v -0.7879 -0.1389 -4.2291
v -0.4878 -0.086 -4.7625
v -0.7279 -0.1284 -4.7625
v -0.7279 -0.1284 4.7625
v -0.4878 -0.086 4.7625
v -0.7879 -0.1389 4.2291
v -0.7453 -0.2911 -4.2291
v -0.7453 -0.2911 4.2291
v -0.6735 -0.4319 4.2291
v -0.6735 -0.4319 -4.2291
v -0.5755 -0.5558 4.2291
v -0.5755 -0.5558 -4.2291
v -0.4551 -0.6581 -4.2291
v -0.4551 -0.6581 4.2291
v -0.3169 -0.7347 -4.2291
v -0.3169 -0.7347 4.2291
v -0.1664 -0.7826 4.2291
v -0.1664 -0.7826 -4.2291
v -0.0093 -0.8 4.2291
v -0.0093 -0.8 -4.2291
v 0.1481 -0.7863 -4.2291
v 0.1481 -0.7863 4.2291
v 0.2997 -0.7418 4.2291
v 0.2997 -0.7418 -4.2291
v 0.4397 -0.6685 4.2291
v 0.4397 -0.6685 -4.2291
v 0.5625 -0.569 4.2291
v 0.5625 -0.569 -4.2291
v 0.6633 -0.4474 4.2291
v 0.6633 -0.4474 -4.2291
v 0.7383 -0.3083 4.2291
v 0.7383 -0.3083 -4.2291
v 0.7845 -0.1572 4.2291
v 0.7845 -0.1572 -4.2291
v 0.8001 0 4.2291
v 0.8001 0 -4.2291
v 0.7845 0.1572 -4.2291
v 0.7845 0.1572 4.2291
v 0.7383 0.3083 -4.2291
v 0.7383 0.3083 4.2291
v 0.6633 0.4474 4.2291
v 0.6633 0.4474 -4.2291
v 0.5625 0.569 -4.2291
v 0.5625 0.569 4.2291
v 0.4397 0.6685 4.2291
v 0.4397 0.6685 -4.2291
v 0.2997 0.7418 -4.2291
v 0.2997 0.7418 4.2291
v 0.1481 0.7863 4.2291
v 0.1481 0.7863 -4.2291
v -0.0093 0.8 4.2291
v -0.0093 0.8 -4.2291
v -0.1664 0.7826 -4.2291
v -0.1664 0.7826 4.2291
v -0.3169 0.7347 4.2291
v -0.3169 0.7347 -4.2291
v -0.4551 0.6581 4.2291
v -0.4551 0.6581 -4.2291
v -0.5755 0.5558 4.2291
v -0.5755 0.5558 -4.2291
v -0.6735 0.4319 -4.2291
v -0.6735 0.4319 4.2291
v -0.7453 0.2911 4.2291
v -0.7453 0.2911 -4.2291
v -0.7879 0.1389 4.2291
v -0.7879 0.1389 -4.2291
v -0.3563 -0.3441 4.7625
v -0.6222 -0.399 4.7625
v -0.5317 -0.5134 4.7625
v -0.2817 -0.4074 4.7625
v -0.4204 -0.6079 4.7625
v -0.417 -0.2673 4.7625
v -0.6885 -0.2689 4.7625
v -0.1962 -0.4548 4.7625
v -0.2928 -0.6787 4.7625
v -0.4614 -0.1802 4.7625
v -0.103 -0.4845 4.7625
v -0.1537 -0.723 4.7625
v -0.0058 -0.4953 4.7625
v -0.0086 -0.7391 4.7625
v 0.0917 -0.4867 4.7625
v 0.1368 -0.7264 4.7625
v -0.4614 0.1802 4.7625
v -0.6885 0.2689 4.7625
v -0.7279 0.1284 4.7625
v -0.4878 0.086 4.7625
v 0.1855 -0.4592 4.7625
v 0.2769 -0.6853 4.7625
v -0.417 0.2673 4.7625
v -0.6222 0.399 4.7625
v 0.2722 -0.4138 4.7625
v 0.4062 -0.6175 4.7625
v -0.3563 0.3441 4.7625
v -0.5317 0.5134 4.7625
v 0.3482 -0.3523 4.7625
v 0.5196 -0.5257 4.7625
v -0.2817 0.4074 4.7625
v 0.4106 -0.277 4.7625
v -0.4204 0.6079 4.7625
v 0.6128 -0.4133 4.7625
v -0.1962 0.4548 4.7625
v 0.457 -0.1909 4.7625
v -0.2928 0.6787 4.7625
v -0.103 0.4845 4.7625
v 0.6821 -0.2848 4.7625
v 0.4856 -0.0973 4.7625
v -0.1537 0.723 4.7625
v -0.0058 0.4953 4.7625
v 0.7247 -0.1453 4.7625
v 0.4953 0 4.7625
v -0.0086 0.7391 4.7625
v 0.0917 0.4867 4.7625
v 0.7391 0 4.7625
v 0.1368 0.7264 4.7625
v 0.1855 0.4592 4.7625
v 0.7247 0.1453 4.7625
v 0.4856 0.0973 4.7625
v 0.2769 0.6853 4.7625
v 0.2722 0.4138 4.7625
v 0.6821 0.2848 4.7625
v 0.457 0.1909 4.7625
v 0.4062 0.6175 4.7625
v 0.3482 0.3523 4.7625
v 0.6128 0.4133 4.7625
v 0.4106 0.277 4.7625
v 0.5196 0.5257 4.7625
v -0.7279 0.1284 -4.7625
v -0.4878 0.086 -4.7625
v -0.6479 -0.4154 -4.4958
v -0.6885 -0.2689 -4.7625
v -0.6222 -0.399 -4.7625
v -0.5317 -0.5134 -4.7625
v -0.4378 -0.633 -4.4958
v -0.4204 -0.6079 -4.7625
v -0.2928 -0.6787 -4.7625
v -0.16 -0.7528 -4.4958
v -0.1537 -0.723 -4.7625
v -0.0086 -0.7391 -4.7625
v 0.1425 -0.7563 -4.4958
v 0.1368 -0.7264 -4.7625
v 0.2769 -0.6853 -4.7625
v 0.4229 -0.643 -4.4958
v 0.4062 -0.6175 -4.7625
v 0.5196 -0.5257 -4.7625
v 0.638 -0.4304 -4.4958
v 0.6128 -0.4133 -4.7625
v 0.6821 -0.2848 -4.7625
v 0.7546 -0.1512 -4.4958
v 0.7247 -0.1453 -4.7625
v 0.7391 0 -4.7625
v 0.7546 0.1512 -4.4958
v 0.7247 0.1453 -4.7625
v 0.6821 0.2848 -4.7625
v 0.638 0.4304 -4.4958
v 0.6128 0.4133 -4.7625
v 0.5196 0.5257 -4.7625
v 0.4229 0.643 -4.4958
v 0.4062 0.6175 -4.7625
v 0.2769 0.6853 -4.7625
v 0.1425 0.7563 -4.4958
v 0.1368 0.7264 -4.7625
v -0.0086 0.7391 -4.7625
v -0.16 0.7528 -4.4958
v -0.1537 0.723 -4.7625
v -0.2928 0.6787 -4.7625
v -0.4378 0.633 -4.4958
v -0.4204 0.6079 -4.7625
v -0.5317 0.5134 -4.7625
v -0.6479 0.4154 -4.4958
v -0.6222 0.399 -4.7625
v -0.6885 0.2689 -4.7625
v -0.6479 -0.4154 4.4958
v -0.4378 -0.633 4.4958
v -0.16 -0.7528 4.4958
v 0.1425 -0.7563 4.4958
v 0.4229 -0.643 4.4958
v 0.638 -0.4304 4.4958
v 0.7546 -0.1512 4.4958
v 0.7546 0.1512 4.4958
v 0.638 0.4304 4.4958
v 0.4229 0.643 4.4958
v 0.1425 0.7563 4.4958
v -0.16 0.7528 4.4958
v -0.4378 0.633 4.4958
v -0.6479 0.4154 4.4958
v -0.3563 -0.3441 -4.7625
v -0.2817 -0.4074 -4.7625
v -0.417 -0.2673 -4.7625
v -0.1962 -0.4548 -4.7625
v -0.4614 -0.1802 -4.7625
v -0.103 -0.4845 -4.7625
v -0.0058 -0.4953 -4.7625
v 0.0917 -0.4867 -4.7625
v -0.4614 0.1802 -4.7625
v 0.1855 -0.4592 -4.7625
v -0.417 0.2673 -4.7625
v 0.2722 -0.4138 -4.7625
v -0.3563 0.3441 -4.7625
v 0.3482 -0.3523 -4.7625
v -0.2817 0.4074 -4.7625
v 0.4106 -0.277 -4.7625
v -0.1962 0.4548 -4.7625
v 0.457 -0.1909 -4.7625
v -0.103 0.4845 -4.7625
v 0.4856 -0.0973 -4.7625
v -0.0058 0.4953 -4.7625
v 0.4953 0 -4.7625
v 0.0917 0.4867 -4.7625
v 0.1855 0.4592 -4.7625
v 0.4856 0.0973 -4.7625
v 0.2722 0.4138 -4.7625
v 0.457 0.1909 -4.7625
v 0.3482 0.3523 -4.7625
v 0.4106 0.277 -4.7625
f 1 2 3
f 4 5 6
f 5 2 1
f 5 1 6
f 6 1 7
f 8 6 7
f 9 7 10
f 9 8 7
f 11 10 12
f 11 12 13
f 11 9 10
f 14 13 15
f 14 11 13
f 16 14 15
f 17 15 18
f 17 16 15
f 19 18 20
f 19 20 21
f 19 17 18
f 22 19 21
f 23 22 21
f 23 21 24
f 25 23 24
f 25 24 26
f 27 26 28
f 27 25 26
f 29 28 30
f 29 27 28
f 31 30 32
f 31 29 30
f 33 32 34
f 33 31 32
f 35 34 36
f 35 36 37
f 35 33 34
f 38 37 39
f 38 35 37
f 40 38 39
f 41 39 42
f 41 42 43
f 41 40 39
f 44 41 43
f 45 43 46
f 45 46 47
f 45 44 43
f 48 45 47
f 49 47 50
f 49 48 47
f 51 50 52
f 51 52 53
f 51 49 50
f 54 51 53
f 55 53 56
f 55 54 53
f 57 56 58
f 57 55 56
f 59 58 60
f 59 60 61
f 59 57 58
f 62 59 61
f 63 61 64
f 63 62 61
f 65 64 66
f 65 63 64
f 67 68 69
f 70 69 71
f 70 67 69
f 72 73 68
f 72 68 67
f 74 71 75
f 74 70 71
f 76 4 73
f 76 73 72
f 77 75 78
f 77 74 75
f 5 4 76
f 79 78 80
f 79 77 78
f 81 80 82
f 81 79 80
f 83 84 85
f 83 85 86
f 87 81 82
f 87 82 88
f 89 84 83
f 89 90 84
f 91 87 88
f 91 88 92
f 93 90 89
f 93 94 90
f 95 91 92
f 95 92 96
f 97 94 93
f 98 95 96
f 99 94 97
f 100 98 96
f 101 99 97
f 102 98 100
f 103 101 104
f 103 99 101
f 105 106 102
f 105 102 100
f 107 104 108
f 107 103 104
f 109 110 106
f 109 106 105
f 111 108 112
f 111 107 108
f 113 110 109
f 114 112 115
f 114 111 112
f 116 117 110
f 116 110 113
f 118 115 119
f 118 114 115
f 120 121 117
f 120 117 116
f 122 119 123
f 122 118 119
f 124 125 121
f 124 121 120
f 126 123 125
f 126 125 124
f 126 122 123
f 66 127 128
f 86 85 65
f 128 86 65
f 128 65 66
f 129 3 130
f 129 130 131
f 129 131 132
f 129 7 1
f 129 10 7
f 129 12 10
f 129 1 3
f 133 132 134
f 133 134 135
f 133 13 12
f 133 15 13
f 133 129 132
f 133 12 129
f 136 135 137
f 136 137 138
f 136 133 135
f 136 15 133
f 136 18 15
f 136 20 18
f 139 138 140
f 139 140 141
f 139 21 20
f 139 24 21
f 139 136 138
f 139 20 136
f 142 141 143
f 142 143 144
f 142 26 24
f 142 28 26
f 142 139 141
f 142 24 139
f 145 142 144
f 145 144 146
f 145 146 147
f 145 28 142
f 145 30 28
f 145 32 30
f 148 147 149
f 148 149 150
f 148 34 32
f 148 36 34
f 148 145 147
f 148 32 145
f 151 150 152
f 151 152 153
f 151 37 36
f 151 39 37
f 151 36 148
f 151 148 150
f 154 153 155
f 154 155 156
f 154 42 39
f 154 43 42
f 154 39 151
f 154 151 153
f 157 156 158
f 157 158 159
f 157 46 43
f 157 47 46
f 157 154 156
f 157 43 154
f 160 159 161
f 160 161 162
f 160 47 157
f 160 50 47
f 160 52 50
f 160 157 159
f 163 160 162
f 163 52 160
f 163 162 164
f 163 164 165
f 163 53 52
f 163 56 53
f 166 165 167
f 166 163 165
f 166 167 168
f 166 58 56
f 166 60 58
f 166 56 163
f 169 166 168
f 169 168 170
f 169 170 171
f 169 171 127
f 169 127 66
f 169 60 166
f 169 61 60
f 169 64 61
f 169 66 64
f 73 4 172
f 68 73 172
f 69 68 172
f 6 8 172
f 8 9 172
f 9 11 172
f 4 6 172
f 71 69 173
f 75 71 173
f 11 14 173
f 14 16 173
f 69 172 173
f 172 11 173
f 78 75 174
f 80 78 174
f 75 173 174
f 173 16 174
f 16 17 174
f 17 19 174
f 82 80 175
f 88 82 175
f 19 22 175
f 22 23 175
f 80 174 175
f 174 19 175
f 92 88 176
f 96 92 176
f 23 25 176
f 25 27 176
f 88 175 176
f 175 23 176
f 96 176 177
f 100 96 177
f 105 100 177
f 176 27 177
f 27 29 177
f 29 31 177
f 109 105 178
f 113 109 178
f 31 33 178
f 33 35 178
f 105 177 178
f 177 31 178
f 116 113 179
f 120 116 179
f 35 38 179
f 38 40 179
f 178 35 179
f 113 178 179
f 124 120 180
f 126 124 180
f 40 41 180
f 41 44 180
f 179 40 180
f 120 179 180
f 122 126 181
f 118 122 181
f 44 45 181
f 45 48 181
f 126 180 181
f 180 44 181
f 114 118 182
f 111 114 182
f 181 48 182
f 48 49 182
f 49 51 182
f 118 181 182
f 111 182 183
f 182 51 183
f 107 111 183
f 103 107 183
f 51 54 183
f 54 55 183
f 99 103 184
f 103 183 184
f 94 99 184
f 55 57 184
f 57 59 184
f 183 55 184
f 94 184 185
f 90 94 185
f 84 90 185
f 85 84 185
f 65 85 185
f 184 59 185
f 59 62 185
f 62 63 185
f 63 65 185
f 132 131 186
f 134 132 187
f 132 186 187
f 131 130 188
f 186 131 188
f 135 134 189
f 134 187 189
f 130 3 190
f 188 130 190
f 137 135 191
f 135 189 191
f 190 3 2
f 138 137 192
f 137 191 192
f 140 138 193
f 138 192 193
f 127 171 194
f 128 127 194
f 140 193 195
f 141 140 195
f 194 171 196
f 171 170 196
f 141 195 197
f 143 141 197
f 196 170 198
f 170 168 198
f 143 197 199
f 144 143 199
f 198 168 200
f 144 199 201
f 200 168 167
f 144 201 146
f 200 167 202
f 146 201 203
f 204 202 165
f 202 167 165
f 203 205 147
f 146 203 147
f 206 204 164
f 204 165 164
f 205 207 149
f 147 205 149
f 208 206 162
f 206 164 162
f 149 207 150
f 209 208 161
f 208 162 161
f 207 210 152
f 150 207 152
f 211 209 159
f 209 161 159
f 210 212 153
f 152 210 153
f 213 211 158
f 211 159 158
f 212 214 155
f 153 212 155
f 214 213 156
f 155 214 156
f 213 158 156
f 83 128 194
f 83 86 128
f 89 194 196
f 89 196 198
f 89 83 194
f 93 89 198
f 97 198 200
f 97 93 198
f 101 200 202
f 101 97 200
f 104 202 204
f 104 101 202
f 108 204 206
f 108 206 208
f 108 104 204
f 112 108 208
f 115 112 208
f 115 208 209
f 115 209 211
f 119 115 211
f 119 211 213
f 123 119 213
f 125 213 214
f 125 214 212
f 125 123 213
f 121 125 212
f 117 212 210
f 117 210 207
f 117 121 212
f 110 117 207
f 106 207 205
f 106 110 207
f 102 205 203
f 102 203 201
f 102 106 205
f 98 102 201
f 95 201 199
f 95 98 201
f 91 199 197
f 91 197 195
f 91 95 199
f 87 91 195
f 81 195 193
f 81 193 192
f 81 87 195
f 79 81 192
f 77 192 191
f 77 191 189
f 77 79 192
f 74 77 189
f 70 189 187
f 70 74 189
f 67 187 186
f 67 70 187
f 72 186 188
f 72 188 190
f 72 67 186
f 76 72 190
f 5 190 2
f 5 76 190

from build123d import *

# Parameters (mm, degrees)
EXTRUDE1_DEPTH      = 4.7625
EXTRUDE1_DEPTH_BACK = 4.7625


with BuildPart() as part:
    # Sketch1 → Extrude1 (new body, two sides)
    with BuildSketch(Plane.XY) as extrude1_sk:
        with BuildLine():
            Line((-0.48777528, -0.086007942), (-0.787944683, -0.138935907))
            ThreePointArc((-0.787944683, -0.138935907), (0.8001, 0), (-0.787944683, 0.138935907))
            Line((-0.787944683, 0.138935907), (-0.48777528, 0.086007942))
            ThreePointArc((-0.48777528, 0.086007942), (0.4953, 0), (-0.48777528, -0.086007942))
        make_face()
    extrude(amount=EXTRUDE1_DEPTH)
    extrude(extrude1_sk.sketch, amount=-EXTRUDE1_DEPTH_BACK)

    # Sketch2 → Cut-Revolve1 (revolve, cut)
    with BuildSketch(Plane(origin=(0, 0, 0), x_dir=(0, 0, -1), z_dir=(1, 0, 0))):
        Polygon((4.7625, 0.73914), (4.2291, 0.8001), (4.7625, 0.8001), align=None)
    cut_revolve1 = revolve(axis=Axis((0, 0, -4.7625), (0, 0, 1)), mode=Mode.SUBTRACT)

    # Mirror1: Cut-Revolve1 across plane
    add(cut_revolve1.mirror(Plane.XY), mode=Mode.SUBTRACT)


solid = part.part
